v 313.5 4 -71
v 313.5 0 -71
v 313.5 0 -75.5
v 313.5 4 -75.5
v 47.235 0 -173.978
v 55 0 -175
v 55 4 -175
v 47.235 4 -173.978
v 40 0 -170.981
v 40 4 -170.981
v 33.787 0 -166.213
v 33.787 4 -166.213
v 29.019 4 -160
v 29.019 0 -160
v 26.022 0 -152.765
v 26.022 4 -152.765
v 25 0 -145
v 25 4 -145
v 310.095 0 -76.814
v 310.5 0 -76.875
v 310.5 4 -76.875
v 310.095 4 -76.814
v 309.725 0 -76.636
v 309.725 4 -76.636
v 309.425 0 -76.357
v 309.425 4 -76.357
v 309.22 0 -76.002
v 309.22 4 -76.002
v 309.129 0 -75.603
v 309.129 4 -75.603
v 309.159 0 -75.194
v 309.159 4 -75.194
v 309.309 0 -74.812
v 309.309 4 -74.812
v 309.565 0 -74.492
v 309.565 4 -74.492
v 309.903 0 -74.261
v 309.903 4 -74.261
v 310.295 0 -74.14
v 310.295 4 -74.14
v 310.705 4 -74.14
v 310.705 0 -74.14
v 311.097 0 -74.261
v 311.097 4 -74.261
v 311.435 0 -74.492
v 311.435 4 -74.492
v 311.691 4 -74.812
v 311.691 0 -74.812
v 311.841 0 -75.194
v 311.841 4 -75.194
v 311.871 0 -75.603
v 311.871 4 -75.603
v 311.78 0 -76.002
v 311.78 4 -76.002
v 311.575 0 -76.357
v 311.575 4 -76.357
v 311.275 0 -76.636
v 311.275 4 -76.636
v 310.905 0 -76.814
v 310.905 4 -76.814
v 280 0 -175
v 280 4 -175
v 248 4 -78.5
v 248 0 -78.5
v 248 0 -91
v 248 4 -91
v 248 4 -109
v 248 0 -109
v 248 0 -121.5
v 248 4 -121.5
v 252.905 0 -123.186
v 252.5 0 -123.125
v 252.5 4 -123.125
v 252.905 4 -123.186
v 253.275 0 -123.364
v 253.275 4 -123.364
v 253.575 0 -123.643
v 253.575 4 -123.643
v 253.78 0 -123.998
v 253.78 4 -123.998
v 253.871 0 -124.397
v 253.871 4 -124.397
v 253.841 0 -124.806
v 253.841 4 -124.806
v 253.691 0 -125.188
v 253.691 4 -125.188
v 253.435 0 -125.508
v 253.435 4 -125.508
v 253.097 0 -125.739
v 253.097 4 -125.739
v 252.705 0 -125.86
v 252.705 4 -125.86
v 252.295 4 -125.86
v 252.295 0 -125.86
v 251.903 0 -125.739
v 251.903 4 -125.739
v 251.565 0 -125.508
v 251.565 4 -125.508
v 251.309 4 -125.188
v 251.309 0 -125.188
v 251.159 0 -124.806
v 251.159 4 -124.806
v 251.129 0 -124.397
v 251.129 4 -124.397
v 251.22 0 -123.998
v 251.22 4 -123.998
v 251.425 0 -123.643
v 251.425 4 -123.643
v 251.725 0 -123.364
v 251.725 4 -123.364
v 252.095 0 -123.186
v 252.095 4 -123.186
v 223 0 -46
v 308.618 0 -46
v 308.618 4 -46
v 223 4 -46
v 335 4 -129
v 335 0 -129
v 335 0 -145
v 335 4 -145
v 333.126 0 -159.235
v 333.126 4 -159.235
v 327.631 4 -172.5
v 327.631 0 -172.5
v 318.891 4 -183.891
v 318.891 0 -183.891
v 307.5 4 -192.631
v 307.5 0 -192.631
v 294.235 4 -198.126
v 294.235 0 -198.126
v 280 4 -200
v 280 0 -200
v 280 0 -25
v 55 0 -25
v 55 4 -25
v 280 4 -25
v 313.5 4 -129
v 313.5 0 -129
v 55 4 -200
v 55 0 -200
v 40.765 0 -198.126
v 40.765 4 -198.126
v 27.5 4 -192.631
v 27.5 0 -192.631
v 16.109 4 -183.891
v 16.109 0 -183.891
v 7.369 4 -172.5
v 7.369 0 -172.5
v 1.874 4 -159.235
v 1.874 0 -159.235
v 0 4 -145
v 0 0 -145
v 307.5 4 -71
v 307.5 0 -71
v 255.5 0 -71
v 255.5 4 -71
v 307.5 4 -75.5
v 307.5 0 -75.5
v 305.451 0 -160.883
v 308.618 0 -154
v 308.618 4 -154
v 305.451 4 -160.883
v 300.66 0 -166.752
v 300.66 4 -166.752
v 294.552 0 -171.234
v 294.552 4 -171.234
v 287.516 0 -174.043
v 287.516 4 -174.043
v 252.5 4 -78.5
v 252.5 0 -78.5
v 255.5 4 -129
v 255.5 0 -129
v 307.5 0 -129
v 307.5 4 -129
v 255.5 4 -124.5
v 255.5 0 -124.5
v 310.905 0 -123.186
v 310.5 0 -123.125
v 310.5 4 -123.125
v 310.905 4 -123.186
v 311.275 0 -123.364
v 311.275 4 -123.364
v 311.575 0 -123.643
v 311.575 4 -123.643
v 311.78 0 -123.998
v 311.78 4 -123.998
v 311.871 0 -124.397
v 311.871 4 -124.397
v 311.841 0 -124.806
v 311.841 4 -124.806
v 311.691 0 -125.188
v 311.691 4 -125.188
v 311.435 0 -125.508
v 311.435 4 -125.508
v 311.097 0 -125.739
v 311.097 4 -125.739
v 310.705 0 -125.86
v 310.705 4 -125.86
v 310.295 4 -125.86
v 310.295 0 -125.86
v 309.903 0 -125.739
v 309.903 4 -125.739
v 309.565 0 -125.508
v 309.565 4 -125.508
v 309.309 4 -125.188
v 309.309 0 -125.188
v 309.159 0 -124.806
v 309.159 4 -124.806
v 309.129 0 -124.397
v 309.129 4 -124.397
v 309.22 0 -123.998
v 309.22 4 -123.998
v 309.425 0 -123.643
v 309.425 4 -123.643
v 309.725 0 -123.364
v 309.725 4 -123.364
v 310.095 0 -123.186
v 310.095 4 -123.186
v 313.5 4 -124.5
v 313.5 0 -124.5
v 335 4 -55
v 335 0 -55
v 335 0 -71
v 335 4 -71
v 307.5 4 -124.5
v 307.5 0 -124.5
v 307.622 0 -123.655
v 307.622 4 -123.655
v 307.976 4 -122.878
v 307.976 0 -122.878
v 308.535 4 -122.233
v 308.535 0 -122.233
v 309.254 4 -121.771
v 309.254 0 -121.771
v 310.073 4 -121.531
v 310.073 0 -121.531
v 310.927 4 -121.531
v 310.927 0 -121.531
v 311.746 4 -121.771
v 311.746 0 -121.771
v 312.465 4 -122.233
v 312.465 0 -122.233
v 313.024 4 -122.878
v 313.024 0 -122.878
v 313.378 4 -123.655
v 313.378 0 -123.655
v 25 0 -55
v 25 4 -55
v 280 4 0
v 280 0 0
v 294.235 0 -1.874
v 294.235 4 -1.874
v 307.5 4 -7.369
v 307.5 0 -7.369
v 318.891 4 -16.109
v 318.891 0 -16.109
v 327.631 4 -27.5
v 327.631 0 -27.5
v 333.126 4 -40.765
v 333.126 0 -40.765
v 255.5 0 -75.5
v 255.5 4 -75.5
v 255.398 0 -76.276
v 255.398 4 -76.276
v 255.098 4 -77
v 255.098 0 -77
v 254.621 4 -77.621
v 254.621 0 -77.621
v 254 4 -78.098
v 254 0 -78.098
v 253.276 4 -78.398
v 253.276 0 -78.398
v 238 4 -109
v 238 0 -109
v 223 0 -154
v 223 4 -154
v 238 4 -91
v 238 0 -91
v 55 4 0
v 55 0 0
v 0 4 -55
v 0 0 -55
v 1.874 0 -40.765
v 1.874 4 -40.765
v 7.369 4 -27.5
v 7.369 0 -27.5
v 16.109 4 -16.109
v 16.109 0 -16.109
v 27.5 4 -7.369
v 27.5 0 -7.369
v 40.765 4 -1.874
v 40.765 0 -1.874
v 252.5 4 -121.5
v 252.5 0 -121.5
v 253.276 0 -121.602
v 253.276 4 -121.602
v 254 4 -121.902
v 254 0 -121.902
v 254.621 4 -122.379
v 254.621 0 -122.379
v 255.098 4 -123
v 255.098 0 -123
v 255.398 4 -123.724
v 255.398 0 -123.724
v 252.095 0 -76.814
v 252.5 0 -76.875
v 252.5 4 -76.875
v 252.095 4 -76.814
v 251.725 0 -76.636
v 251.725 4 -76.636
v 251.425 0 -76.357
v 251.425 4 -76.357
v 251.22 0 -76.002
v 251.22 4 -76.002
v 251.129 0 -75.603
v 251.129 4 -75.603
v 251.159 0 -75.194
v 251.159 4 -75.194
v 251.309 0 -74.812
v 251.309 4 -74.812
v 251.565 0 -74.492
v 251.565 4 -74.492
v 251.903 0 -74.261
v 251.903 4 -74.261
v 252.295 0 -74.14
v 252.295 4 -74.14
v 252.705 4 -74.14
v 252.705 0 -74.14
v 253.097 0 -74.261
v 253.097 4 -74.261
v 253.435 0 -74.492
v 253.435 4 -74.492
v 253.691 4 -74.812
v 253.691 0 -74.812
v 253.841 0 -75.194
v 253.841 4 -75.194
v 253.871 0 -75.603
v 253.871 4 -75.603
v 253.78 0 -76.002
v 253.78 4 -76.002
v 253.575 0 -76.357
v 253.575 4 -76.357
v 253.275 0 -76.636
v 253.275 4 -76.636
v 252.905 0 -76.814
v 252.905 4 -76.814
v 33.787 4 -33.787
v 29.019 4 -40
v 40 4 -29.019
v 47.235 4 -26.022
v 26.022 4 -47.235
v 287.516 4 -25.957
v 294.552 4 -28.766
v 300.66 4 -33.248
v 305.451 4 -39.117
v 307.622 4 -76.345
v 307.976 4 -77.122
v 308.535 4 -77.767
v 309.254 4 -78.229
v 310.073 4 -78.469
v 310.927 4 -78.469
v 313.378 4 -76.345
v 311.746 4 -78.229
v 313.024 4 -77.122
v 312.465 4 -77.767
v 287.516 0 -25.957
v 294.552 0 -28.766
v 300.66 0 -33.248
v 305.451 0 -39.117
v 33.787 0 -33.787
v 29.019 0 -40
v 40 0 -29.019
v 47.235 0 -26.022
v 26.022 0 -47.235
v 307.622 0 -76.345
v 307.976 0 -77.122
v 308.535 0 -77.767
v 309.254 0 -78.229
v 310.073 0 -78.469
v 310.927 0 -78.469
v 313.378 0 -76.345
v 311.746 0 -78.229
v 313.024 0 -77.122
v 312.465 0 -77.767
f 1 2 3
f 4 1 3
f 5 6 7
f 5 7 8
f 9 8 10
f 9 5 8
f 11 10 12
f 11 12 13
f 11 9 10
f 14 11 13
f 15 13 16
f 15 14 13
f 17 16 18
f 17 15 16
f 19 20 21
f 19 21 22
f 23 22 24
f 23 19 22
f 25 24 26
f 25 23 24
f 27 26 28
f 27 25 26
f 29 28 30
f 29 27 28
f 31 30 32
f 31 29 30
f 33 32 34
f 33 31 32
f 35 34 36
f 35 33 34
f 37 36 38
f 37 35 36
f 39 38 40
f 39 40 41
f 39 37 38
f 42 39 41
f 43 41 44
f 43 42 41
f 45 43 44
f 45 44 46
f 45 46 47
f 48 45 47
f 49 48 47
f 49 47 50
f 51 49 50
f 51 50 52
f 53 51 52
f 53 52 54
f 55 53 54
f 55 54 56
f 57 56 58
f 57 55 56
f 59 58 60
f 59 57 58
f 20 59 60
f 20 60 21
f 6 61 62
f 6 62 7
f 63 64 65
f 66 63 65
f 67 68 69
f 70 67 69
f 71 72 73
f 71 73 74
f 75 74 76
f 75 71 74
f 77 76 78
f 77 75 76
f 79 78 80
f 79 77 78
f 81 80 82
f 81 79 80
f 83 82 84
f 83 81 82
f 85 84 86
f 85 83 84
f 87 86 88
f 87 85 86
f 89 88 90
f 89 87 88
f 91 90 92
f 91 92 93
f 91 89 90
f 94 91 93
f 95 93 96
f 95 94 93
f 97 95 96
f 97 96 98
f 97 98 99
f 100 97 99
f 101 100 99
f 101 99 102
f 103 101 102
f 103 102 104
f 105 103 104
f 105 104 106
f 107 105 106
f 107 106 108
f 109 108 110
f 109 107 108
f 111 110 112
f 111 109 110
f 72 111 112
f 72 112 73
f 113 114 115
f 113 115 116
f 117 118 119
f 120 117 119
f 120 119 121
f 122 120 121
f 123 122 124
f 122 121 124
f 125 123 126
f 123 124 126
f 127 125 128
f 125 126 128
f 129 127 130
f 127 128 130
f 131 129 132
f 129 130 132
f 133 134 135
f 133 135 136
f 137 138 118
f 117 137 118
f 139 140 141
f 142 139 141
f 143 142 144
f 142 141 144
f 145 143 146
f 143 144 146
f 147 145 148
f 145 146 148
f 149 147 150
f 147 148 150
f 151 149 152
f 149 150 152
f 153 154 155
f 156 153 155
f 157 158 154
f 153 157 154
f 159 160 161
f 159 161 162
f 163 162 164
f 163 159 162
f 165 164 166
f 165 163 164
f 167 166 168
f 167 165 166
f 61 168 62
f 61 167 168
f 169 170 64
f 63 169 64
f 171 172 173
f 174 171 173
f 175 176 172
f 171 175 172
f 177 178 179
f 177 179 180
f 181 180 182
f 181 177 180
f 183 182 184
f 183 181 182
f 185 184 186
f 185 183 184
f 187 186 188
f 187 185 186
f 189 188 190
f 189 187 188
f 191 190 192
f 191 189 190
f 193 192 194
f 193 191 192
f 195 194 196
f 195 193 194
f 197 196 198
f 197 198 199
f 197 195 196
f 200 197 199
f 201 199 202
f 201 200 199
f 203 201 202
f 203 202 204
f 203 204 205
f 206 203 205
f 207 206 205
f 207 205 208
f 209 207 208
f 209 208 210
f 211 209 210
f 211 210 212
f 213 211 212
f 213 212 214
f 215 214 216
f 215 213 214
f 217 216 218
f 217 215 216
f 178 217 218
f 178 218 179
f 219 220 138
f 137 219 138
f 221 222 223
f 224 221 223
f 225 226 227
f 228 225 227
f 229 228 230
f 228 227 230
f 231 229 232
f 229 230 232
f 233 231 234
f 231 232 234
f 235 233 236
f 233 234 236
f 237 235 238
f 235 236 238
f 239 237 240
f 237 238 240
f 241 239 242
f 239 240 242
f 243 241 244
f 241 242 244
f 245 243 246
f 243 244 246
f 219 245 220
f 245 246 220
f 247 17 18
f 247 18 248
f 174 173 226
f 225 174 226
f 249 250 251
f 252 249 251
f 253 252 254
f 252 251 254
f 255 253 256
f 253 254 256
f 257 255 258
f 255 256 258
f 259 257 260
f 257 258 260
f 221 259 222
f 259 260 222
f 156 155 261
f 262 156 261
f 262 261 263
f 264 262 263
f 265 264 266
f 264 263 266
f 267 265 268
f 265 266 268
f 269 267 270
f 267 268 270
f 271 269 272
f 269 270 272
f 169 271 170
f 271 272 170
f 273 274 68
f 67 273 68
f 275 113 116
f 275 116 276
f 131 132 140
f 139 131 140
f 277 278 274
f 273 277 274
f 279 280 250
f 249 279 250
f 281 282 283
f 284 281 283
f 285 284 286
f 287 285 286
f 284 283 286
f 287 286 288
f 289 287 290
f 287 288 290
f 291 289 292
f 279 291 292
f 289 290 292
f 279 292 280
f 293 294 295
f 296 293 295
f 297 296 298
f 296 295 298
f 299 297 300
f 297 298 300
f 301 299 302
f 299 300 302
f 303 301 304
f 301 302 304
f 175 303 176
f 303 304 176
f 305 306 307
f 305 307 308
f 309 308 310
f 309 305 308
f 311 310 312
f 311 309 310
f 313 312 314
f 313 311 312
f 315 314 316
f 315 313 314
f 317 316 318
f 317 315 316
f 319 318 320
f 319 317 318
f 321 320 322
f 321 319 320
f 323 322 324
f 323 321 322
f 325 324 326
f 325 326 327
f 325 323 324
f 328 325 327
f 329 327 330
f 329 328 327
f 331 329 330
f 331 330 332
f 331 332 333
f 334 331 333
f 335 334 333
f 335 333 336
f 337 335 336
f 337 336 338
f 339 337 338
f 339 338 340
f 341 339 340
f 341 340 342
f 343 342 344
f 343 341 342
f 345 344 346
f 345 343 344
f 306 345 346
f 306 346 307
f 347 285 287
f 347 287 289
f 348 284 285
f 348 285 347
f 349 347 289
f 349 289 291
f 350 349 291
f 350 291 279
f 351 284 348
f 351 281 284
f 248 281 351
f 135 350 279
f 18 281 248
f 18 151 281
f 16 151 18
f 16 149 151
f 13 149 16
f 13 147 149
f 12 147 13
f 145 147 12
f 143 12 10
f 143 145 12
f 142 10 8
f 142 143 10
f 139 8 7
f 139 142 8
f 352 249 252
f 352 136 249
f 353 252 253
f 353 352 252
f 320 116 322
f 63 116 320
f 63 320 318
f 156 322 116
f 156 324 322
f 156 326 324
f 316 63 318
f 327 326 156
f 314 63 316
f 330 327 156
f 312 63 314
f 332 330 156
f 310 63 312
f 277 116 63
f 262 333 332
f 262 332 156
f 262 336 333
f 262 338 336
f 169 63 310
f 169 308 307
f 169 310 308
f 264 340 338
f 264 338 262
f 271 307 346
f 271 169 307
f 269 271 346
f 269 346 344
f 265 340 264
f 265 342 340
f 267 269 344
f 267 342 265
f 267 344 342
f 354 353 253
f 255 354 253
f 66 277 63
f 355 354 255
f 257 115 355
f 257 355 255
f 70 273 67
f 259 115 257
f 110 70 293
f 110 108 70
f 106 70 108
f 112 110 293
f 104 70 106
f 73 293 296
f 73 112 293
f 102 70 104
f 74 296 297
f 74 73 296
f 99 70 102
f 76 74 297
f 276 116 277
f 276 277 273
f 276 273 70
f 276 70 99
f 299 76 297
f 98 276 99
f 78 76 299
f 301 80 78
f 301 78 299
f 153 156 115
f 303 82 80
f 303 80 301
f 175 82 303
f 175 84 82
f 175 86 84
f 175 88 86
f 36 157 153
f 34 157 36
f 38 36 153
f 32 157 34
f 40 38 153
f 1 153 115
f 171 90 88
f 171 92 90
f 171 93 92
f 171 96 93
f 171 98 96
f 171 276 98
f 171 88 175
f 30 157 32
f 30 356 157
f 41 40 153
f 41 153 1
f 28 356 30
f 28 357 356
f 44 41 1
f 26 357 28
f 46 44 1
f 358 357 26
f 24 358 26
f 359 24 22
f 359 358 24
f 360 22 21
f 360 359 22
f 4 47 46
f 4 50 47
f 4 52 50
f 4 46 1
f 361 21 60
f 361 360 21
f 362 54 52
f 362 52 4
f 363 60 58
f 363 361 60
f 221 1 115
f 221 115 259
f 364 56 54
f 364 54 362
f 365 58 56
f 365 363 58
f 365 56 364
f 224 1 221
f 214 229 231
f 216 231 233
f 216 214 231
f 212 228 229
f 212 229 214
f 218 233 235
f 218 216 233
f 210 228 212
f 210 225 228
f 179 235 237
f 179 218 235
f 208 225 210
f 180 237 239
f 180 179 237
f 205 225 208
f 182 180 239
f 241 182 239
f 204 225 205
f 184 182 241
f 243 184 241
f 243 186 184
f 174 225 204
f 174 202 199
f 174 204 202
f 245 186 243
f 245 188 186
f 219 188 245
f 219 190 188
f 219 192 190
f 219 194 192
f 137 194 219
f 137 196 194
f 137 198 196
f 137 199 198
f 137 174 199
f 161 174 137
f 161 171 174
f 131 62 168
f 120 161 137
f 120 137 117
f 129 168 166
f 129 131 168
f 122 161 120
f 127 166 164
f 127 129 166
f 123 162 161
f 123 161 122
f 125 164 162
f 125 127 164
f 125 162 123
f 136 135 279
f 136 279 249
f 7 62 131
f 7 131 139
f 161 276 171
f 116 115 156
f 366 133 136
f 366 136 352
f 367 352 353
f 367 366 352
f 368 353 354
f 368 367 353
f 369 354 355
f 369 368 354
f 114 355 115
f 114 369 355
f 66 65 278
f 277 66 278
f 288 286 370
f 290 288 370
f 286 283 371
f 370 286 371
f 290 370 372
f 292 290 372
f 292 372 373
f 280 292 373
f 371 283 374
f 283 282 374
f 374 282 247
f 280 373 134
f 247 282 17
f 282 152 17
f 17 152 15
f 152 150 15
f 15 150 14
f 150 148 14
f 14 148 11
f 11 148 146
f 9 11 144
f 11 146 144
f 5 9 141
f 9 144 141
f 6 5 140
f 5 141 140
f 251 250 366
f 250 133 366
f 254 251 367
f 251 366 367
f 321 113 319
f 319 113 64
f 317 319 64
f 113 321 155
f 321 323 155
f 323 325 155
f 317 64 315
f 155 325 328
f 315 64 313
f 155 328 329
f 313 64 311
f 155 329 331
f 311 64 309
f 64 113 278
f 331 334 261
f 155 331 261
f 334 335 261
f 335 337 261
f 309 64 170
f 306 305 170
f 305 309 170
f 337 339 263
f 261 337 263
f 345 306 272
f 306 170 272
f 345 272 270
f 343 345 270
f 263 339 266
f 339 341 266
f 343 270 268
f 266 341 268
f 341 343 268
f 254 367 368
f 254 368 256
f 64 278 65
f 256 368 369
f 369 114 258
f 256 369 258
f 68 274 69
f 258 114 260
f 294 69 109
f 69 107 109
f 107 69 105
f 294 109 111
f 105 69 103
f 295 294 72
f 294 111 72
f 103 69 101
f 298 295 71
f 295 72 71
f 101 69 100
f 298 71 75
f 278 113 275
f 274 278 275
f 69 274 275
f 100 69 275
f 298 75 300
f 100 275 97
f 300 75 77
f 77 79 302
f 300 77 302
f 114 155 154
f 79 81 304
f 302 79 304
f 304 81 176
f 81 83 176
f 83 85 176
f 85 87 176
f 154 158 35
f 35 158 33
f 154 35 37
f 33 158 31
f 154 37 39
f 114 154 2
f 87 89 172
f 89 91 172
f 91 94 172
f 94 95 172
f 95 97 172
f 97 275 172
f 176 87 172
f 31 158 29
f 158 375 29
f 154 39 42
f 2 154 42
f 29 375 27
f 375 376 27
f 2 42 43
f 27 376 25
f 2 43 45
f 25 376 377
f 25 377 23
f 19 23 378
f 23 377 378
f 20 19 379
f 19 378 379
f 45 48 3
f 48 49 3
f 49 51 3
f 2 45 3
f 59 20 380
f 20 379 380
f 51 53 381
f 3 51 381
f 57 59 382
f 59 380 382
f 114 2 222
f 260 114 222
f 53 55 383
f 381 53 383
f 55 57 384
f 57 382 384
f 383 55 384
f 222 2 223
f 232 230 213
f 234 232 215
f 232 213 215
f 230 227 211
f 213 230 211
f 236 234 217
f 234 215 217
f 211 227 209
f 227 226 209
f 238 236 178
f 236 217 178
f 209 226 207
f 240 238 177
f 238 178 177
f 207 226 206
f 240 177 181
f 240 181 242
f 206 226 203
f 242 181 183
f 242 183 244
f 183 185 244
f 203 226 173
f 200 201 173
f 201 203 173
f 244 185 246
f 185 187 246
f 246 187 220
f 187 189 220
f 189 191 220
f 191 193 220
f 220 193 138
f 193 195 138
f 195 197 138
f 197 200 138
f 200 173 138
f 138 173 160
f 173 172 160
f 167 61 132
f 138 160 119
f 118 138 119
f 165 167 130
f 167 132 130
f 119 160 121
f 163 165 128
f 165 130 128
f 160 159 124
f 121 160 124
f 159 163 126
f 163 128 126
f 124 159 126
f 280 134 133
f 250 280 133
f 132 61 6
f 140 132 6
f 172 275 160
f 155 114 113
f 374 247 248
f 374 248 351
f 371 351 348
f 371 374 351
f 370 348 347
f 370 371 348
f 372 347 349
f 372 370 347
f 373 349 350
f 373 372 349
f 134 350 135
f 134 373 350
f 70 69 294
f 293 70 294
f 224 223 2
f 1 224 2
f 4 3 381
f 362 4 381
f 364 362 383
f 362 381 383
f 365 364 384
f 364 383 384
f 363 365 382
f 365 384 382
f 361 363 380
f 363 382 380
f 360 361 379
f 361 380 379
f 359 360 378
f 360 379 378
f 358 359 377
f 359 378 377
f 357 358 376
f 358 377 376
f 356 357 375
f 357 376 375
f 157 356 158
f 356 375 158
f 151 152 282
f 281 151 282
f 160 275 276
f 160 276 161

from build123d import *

# Parameters (mm, degrees)
SKETCH1_R           = 1.375
BOSS_EXTRUDE1_DEPTH = 4


with BuildPart() as part:
    # Sketch1 → Boss-Extrude1 (new body)
    with BuildSketch(Plane(origin=(0, 0, 0), x_dir=(1, 0, 0), z_dir=(0, 1, 0))):
        with BuildLine():
            Line((55, 0), (280, 0))
            ThreePointArc((280, 0), (318.890872965, 16.109127035), (335, 55))
            Line((335, 55), (335, 71))
            Line((335, 71), (313.5, 71))
            Line((313.5, 71), (313.5, 75.5))
            ThreePointArc((313.5, 75.5), (310.5, 78.5), (307.5, 75.5))
            Line((307.5, 75.5), (307.5, 71))
            Line((307.5, 71), (255.5, 71))
            Line((255.5, 71), (255.5, 75.5))
            ThreePointArc((255.5, 75.5), (254.621320344, 77.621320344), (252.5, 78.5))
            Line((252.5, 78.5), (248, 78.5))
            Line((248, 78.5), (248, 91))
            Line((248, 91), (238, 91))
            Line((238, 91), (238, 109))
            Line((238, 109), (248, 109))
            Line((248, 109), (248, 121.5))
            Line((248, 121.5), (252.5, 121.5))
            ThreePointArc((252.5, 121.5), (254.621320344, 122.378679656), (255.5, 124.5))
            Line((255.5, 124.5), (255.5, 129))
            Line((255.5, 129), (307.5, 129))
            Line((307.5, 129), (307.5, 124.5))
            ThreePointArc((307.5, 124.5), (310.5, 121.5), (313.5, 124.5))
            Line((313.5, 124.5), (313.5, 129))
            Line((313.5, 129), (335, 129))
            Line((335, 129), (335, 145))
            ThreePointArc((335, 145), (318.890872965, 183.890872965), (280, 200))
            Line((280, 200), (55, 200))
            ThreePointArc((55, 200), (16.109127035, 183.890872965), (0, 145))
            Line((0, 145), (0, 55))
            ThreePointArc((0, 55), (16.109127035, 16.109127035), (55, 0))
        make_face()
        with Locations(Location((252.5, 124.5, 0), (0, 0, 270))):
            Circle(SKETCH1_R, mode=Mode.SUBTRACT)
        with Locations(Location((252.5, 75.5, 0), (0, 0, 90))):
            Circle(SKETCH1_R, mode=Mode.SUBTRACT)
        with Locations(Location((310.5, 124.5, 0), (0, 0, 270))):
            Circle(SKETCH1_R, mode=Mode.SUBTRACT)
        with Locations(Location((310.5, 75.5, 0), (0, 0, 90))):
            Circle(SKETCH1_R, mode=Mode.SUBTRACT)
        with BuildLine():
            Line((55, 25), (280, 25))
            ThreePointArc((280, 25), (297.748239349, 30.813226755), (308.618176043, 46))
            Line((308.618176043, 46), (223, 46))
            Line((223, 46), (223, 154))
            Line((223, 154), (308.618176043, 154))
            ThreePointArc((308.618176043, 154), (297.748239349, 169.186773245), (280, 175))
            Line((280, 175), (55, 175))
            ThreePointArc((55, 175), (33.786796564, 166.213203436), (25, 145))
            Line((25, 145), (25, 55))
            ThreePointArc((25, 55), (33.786796564, 33.786796564), (55, 25))
        make_face(mode=Mode.SUBTRACT)
    extrude(amount=BOSS_EXTRUDE1_DEPTH)


solid = part.part
